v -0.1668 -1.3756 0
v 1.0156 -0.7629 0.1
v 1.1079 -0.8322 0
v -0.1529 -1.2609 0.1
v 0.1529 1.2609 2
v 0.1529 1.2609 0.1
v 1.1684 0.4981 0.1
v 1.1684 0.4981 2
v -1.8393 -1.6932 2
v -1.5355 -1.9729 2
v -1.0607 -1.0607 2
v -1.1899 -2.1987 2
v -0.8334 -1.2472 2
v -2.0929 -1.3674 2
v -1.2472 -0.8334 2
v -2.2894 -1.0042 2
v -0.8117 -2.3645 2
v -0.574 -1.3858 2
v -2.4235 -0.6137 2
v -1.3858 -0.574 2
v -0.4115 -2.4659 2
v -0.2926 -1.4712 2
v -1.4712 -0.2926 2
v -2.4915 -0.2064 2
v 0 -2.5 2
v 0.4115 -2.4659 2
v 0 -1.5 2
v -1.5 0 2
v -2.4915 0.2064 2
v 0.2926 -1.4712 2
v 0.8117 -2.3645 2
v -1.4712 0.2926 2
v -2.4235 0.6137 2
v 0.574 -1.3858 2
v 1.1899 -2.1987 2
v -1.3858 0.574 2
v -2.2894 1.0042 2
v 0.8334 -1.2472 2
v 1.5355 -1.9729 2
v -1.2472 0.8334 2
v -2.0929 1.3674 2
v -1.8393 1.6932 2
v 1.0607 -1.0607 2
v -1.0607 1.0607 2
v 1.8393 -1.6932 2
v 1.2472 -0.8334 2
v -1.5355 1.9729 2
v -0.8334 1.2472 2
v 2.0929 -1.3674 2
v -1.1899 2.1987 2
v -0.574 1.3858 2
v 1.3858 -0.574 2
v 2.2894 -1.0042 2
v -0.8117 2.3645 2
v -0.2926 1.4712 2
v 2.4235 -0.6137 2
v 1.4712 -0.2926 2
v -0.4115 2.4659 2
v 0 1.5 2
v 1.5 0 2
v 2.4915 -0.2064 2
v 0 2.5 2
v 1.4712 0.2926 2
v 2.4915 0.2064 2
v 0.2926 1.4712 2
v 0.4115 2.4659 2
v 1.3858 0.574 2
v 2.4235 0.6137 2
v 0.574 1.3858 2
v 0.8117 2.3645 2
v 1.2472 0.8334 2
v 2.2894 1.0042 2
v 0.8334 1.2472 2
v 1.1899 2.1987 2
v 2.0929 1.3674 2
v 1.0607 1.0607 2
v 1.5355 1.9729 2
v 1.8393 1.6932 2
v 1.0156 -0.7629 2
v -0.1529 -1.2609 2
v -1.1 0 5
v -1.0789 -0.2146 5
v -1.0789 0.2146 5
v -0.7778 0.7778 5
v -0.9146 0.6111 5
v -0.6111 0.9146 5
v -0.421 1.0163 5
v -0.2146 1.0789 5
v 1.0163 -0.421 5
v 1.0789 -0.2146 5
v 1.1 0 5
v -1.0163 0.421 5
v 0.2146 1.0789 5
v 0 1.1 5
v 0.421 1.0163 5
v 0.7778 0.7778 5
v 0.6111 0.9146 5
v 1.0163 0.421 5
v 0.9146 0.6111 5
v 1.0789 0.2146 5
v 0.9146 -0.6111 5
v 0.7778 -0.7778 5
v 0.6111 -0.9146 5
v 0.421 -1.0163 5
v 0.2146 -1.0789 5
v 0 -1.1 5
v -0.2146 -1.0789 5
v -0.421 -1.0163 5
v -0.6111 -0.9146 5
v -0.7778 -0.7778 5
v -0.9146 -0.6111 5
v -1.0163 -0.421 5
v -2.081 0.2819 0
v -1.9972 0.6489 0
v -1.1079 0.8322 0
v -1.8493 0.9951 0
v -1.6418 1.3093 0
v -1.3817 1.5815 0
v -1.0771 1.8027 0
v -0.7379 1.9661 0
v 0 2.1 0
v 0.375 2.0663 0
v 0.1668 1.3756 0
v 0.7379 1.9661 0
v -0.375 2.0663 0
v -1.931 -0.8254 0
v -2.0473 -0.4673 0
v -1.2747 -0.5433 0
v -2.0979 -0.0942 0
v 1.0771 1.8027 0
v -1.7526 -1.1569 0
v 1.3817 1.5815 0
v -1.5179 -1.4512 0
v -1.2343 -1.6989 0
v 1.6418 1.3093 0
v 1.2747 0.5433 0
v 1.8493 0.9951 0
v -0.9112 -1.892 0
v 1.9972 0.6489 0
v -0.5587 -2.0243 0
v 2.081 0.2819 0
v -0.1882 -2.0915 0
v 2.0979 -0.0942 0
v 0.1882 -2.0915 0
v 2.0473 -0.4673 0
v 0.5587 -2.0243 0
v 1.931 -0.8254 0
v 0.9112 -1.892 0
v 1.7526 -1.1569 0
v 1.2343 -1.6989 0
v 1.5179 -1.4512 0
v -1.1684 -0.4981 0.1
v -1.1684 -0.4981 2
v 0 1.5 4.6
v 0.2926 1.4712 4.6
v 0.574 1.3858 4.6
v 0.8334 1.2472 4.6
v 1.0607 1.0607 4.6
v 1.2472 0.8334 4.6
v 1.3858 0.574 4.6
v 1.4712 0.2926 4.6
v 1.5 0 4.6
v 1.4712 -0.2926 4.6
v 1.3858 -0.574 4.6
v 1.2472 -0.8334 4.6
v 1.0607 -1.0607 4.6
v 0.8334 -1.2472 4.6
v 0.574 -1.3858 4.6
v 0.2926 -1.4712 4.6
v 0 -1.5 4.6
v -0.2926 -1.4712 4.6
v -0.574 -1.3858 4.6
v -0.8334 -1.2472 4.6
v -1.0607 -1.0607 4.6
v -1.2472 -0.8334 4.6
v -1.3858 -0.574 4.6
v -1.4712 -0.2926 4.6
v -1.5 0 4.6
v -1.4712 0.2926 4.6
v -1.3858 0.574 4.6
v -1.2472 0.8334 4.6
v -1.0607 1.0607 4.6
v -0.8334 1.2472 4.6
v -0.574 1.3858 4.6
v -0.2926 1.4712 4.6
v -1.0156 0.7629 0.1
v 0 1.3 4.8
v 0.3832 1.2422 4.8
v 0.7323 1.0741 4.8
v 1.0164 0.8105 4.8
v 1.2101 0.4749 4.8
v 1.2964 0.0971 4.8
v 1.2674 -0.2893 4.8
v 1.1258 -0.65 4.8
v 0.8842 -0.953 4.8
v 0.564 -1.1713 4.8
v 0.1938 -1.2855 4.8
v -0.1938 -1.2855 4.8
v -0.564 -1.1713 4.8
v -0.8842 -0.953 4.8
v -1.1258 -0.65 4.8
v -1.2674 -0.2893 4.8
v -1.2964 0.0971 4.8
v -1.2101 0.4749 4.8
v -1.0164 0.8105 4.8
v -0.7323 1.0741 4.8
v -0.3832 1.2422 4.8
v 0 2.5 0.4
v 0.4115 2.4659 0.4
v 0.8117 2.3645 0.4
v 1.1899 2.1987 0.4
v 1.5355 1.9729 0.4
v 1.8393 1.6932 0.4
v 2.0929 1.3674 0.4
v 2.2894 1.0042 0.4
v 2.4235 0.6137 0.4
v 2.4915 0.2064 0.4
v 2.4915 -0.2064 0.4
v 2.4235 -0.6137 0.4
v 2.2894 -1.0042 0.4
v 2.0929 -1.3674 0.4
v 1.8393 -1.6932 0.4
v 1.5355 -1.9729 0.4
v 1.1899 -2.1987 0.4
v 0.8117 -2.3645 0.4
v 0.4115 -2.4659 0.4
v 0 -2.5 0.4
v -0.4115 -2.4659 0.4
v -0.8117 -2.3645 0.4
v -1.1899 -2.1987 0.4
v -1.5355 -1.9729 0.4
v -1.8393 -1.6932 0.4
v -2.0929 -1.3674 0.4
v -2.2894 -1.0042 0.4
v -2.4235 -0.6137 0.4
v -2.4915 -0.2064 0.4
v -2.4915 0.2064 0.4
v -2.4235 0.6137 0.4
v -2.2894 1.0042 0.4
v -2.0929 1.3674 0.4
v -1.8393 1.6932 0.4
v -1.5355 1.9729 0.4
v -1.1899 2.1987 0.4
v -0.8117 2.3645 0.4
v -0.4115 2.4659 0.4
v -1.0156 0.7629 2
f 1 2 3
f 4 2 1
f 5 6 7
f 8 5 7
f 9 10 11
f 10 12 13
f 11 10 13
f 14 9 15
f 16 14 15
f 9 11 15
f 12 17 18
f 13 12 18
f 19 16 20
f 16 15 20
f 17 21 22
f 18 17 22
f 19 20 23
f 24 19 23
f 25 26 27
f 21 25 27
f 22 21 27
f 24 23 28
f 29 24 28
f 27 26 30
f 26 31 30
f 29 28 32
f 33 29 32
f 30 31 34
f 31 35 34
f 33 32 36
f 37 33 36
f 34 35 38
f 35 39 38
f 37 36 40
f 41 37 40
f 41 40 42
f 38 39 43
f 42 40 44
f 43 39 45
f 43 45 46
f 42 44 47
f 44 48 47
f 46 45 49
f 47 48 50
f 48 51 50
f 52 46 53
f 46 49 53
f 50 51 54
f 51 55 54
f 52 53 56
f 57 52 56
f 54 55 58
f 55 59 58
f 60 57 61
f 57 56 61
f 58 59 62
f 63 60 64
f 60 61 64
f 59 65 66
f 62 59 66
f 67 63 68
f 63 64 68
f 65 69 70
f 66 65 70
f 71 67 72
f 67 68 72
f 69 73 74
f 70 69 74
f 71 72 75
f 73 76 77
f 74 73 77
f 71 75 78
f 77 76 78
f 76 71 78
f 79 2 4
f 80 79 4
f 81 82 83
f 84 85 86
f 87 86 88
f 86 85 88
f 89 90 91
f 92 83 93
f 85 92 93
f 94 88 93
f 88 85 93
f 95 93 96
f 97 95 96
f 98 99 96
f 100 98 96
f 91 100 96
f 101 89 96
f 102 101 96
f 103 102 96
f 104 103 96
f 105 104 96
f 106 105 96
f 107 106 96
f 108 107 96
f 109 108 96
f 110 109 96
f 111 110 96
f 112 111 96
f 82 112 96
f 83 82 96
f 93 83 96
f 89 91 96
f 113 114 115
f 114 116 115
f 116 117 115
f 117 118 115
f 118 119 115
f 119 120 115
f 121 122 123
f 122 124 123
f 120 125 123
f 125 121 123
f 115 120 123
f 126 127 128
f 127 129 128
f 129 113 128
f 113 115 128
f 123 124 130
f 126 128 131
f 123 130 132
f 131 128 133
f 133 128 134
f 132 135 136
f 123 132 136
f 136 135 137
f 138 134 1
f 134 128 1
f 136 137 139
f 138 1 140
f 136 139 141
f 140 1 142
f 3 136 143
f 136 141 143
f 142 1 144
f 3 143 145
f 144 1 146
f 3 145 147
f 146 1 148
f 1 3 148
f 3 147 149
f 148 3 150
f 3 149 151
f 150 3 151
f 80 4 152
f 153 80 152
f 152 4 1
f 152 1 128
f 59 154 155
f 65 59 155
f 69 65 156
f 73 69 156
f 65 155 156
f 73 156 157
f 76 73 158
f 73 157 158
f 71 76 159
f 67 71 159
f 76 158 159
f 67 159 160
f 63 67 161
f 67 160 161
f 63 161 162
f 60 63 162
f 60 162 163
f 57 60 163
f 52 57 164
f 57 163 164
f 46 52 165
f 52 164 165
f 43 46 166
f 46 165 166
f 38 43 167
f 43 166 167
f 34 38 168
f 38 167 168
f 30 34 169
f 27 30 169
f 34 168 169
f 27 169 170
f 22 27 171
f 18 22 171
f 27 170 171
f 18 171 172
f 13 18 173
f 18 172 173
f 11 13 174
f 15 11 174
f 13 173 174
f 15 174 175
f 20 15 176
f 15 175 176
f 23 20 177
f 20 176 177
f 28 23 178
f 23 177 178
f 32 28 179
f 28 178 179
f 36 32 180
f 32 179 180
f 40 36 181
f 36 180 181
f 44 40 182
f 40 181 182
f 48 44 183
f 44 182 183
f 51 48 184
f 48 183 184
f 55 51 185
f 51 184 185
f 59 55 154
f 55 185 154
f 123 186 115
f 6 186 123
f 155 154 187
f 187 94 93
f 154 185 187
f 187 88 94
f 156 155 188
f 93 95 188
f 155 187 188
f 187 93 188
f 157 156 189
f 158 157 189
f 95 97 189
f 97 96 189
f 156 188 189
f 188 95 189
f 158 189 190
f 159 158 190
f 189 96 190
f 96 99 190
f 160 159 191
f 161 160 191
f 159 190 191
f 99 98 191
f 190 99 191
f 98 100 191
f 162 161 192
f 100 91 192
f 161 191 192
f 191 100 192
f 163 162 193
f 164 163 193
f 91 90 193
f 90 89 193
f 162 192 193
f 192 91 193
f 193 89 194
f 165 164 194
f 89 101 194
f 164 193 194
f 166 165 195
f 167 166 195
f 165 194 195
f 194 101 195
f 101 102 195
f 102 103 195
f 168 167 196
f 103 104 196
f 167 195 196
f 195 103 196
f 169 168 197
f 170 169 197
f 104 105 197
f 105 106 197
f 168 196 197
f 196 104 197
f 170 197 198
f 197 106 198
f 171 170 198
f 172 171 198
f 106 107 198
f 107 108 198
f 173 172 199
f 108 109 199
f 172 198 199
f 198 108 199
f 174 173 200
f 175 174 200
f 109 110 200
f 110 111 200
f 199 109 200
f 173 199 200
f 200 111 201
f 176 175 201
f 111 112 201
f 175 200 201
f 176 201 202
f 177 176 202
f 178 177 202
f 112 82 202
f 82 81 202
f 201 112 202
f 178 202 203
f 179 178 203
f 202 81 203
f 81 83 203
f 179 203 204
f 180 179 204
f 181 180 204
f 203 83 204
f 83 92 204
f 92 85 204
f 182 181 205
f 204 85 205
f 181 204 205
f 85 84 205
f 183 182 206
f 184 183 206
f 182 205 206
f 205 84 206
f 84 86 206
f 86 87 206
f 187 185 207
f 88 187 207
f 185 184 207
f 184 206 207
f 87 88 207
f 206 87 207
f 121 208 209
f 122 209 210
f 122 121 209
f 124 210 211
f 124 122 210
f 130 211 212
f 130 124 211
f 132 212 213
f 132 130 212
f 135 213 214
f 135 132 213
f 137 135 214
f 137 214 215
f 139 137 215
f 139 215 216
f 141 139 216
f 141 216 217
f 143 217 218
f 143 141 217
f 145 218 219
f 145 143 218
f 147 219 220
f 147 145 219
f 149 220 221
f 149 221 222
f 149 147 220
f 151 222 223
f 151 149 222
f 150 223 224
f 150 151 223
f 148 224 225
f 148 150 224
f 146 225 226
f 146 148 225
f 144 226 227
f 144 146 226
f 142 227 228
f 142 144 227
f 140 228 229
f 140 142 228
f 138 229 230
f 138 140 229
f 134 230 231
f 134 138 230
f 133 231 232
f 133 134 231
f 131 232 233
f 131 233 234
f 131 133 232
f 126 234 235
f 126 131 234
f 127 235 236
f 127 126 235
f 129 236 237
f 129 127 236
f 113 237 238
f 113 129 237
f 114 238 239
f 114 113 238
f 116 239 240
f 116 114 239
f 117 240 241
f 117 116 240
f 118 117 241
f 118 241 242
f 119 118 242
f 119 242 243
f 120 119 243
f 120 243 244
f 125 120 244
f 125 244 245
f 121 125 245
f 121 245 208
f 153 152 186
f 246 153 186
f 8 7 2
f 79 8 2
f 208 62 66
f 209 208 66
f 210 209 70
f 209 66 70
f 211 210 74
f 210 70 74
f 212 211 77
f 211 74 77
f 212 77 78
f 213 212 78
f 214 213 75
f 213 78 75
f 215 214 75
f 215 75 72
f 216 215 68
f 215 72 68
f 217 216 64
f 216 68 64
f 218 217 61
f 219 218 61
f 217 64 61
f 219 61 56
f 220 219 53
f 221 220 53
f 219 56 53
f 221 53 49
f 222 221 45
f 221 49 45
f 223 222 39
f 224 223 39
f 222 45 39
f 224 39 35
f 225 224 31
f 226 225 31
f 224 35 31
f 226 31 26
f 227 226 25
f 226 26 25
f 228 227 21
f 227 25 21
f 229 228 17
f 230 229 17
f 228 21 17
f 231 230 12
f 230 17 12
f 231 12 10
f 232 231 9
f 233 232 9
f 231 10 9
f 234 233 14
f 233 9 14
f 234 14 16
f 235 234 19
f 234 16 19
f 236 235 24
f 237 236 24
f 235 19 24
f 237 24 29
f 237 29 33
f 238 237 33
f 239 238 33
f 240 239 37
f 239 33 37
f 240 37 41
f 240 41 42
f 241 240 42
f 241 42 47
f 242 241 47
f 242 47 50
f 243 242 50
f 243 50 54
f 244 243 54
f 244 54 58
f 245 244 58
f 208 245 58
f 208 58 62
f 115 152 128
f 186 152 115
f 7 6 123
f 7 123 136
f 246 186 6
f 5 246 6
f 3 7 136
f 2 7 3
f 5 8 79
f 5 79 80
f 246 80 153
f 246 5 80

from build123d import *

# Parameters (mm, degrees)
CUT_EXTRUDE1_DEPTH = 2
CHAMFER1_SIZE      = 0.4
CHAMFER2_SIZE      = 0.1


with BuildPart() as part:
    # Sketch2 → Revolve1 (revolve)
    with BuildSketch(Plane(origin=(0, 0, 0), x_dir=(0, 0, -1), z_dir=(1, 0, 0))):
        Polygon((0, 2.5), (-2, 2.5), (-2, 1.5), (-5, 1.5), (-5, 0), (0, 0), align=None)
    revolve(axis=Axis((0, 0, 5), (0, 0, -1)))

    # Sketch3 → Cut-Extrude1 (cut)
    with BuildSketch(Plane(origin=(0, 0, 0), x_dir=(-1, 0, 0), z_dir=(0, 0, -1))):
        Polygon((1.168445951, -0.498063644), (1.015558744, 0.762872054), (-0.152887207, 1.260935698), (-1.168445951, 0.498063644), (-1.015558744, -0.762872054), (0.152887207, -1.260935698), align=None)
    extrude(amount=-CUT_EXTRUDE1_DEPTH, mode=Mode.SUBTRACT)

    # Chamfer1
    chamfer1_edges = [part.edges().sort_by_distance(p)[0] for p in [
        (0, -1.5, 5),
        (0, -2.5, 0),
    ]]
    chamfer(chamfer1_edges, length=CHAMFER1_SIZE)

    # Chamfer2
    chamfer2_edges = [part.edges().sort_by_distance(p)[0] for p in [
        (-0.660666579, -0.879499671, 0),
        (-1.092002347, 0.132404205, 0),
        (-0.431335769, 1.011903876, 0),
        (0.660666579, 0.879499671, 0),
        (1.092002347, -0.132404205, 0),
        (0.431335769, -1.011903876, 0),
    ]]
    chamfer(chamfer2_edges, length=CHAMFER2_SIZE)


solid = part.part
